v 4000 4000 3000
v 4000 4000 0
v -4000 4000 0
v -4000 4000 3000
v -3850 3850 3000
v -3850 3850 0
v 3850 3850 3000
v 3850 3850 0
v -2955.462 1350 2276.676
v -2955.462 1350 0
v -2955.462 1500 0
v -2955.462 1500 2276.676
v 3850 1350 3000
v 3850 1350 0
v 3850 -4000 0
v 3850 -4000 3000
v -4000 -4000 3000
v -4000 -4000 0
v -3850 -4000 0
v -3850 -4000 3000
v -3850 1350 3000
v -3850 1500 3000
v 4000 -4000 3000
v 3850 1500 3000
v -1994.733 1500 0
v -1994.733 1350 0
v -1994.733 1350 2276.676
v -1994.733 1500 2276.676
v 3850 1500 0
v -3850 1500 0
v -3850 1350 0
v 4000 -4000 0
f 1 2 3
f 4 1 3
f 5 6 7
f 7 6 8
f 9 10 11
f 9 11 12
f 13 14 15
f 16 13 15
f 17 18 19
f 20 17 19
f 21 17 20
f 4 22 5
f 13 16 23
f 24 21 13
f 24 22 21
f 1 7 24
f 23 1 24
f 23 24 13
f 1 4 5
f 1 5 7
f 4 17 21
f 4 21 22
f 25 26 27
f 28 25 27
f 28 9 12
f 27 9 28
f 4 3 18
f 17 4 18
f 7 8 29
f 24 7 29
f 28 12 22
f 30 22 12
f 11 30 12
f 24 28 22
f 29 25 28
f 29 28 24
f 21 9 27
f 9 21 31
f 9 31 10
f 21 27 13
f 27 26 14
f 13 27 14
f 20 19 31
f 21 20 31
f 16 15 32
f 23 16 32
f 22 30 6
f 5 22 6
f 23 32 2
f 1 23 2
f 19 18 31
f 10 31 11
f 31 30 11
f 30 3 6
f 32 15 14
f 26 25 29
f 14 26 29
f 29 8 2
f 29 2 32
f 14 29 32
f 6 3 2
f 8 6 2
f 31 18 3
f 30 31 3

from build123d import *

# Parameters (mm, degrees)
F0_W     = 7700
F0_H     = 150
F1_DEPTH = 3000
F2_W     = 960.7286453247
F2_H     = 2276.6757011414
F3_DEPTH = 150


with BuildPart() as f1:
    # F0 (on Top) → F1 (new body)
    with BuildSketch(Plane.XY):
        Polygon((4000, -4000), (4000, 4000), (-4000, 4000), (-4000, -4000), (-3850, -4000), (-3850, 1350), (-3850, 1500), (-3850, 3850), (3850, 3850), (3850, 1500), (3850, 1350), (3850, -4000), align=None)
        with Locations((0, 1425)):
            Rectangle(F0_W, F0_H)
    extrude(amount=F1_DEPTH)

    # F2 (on face) → F3 (cut, through all)
    with BuildSketch(Plane.XZ.offset(-1350)):
        with Locations((-2475.0974178314, 1138.3378505707)):
            Rectangle(F2_W, F2_H)
    extrude(amount=-F3_DEPTH, mode=Mode.SUBTRACT)


solid = f1.part
